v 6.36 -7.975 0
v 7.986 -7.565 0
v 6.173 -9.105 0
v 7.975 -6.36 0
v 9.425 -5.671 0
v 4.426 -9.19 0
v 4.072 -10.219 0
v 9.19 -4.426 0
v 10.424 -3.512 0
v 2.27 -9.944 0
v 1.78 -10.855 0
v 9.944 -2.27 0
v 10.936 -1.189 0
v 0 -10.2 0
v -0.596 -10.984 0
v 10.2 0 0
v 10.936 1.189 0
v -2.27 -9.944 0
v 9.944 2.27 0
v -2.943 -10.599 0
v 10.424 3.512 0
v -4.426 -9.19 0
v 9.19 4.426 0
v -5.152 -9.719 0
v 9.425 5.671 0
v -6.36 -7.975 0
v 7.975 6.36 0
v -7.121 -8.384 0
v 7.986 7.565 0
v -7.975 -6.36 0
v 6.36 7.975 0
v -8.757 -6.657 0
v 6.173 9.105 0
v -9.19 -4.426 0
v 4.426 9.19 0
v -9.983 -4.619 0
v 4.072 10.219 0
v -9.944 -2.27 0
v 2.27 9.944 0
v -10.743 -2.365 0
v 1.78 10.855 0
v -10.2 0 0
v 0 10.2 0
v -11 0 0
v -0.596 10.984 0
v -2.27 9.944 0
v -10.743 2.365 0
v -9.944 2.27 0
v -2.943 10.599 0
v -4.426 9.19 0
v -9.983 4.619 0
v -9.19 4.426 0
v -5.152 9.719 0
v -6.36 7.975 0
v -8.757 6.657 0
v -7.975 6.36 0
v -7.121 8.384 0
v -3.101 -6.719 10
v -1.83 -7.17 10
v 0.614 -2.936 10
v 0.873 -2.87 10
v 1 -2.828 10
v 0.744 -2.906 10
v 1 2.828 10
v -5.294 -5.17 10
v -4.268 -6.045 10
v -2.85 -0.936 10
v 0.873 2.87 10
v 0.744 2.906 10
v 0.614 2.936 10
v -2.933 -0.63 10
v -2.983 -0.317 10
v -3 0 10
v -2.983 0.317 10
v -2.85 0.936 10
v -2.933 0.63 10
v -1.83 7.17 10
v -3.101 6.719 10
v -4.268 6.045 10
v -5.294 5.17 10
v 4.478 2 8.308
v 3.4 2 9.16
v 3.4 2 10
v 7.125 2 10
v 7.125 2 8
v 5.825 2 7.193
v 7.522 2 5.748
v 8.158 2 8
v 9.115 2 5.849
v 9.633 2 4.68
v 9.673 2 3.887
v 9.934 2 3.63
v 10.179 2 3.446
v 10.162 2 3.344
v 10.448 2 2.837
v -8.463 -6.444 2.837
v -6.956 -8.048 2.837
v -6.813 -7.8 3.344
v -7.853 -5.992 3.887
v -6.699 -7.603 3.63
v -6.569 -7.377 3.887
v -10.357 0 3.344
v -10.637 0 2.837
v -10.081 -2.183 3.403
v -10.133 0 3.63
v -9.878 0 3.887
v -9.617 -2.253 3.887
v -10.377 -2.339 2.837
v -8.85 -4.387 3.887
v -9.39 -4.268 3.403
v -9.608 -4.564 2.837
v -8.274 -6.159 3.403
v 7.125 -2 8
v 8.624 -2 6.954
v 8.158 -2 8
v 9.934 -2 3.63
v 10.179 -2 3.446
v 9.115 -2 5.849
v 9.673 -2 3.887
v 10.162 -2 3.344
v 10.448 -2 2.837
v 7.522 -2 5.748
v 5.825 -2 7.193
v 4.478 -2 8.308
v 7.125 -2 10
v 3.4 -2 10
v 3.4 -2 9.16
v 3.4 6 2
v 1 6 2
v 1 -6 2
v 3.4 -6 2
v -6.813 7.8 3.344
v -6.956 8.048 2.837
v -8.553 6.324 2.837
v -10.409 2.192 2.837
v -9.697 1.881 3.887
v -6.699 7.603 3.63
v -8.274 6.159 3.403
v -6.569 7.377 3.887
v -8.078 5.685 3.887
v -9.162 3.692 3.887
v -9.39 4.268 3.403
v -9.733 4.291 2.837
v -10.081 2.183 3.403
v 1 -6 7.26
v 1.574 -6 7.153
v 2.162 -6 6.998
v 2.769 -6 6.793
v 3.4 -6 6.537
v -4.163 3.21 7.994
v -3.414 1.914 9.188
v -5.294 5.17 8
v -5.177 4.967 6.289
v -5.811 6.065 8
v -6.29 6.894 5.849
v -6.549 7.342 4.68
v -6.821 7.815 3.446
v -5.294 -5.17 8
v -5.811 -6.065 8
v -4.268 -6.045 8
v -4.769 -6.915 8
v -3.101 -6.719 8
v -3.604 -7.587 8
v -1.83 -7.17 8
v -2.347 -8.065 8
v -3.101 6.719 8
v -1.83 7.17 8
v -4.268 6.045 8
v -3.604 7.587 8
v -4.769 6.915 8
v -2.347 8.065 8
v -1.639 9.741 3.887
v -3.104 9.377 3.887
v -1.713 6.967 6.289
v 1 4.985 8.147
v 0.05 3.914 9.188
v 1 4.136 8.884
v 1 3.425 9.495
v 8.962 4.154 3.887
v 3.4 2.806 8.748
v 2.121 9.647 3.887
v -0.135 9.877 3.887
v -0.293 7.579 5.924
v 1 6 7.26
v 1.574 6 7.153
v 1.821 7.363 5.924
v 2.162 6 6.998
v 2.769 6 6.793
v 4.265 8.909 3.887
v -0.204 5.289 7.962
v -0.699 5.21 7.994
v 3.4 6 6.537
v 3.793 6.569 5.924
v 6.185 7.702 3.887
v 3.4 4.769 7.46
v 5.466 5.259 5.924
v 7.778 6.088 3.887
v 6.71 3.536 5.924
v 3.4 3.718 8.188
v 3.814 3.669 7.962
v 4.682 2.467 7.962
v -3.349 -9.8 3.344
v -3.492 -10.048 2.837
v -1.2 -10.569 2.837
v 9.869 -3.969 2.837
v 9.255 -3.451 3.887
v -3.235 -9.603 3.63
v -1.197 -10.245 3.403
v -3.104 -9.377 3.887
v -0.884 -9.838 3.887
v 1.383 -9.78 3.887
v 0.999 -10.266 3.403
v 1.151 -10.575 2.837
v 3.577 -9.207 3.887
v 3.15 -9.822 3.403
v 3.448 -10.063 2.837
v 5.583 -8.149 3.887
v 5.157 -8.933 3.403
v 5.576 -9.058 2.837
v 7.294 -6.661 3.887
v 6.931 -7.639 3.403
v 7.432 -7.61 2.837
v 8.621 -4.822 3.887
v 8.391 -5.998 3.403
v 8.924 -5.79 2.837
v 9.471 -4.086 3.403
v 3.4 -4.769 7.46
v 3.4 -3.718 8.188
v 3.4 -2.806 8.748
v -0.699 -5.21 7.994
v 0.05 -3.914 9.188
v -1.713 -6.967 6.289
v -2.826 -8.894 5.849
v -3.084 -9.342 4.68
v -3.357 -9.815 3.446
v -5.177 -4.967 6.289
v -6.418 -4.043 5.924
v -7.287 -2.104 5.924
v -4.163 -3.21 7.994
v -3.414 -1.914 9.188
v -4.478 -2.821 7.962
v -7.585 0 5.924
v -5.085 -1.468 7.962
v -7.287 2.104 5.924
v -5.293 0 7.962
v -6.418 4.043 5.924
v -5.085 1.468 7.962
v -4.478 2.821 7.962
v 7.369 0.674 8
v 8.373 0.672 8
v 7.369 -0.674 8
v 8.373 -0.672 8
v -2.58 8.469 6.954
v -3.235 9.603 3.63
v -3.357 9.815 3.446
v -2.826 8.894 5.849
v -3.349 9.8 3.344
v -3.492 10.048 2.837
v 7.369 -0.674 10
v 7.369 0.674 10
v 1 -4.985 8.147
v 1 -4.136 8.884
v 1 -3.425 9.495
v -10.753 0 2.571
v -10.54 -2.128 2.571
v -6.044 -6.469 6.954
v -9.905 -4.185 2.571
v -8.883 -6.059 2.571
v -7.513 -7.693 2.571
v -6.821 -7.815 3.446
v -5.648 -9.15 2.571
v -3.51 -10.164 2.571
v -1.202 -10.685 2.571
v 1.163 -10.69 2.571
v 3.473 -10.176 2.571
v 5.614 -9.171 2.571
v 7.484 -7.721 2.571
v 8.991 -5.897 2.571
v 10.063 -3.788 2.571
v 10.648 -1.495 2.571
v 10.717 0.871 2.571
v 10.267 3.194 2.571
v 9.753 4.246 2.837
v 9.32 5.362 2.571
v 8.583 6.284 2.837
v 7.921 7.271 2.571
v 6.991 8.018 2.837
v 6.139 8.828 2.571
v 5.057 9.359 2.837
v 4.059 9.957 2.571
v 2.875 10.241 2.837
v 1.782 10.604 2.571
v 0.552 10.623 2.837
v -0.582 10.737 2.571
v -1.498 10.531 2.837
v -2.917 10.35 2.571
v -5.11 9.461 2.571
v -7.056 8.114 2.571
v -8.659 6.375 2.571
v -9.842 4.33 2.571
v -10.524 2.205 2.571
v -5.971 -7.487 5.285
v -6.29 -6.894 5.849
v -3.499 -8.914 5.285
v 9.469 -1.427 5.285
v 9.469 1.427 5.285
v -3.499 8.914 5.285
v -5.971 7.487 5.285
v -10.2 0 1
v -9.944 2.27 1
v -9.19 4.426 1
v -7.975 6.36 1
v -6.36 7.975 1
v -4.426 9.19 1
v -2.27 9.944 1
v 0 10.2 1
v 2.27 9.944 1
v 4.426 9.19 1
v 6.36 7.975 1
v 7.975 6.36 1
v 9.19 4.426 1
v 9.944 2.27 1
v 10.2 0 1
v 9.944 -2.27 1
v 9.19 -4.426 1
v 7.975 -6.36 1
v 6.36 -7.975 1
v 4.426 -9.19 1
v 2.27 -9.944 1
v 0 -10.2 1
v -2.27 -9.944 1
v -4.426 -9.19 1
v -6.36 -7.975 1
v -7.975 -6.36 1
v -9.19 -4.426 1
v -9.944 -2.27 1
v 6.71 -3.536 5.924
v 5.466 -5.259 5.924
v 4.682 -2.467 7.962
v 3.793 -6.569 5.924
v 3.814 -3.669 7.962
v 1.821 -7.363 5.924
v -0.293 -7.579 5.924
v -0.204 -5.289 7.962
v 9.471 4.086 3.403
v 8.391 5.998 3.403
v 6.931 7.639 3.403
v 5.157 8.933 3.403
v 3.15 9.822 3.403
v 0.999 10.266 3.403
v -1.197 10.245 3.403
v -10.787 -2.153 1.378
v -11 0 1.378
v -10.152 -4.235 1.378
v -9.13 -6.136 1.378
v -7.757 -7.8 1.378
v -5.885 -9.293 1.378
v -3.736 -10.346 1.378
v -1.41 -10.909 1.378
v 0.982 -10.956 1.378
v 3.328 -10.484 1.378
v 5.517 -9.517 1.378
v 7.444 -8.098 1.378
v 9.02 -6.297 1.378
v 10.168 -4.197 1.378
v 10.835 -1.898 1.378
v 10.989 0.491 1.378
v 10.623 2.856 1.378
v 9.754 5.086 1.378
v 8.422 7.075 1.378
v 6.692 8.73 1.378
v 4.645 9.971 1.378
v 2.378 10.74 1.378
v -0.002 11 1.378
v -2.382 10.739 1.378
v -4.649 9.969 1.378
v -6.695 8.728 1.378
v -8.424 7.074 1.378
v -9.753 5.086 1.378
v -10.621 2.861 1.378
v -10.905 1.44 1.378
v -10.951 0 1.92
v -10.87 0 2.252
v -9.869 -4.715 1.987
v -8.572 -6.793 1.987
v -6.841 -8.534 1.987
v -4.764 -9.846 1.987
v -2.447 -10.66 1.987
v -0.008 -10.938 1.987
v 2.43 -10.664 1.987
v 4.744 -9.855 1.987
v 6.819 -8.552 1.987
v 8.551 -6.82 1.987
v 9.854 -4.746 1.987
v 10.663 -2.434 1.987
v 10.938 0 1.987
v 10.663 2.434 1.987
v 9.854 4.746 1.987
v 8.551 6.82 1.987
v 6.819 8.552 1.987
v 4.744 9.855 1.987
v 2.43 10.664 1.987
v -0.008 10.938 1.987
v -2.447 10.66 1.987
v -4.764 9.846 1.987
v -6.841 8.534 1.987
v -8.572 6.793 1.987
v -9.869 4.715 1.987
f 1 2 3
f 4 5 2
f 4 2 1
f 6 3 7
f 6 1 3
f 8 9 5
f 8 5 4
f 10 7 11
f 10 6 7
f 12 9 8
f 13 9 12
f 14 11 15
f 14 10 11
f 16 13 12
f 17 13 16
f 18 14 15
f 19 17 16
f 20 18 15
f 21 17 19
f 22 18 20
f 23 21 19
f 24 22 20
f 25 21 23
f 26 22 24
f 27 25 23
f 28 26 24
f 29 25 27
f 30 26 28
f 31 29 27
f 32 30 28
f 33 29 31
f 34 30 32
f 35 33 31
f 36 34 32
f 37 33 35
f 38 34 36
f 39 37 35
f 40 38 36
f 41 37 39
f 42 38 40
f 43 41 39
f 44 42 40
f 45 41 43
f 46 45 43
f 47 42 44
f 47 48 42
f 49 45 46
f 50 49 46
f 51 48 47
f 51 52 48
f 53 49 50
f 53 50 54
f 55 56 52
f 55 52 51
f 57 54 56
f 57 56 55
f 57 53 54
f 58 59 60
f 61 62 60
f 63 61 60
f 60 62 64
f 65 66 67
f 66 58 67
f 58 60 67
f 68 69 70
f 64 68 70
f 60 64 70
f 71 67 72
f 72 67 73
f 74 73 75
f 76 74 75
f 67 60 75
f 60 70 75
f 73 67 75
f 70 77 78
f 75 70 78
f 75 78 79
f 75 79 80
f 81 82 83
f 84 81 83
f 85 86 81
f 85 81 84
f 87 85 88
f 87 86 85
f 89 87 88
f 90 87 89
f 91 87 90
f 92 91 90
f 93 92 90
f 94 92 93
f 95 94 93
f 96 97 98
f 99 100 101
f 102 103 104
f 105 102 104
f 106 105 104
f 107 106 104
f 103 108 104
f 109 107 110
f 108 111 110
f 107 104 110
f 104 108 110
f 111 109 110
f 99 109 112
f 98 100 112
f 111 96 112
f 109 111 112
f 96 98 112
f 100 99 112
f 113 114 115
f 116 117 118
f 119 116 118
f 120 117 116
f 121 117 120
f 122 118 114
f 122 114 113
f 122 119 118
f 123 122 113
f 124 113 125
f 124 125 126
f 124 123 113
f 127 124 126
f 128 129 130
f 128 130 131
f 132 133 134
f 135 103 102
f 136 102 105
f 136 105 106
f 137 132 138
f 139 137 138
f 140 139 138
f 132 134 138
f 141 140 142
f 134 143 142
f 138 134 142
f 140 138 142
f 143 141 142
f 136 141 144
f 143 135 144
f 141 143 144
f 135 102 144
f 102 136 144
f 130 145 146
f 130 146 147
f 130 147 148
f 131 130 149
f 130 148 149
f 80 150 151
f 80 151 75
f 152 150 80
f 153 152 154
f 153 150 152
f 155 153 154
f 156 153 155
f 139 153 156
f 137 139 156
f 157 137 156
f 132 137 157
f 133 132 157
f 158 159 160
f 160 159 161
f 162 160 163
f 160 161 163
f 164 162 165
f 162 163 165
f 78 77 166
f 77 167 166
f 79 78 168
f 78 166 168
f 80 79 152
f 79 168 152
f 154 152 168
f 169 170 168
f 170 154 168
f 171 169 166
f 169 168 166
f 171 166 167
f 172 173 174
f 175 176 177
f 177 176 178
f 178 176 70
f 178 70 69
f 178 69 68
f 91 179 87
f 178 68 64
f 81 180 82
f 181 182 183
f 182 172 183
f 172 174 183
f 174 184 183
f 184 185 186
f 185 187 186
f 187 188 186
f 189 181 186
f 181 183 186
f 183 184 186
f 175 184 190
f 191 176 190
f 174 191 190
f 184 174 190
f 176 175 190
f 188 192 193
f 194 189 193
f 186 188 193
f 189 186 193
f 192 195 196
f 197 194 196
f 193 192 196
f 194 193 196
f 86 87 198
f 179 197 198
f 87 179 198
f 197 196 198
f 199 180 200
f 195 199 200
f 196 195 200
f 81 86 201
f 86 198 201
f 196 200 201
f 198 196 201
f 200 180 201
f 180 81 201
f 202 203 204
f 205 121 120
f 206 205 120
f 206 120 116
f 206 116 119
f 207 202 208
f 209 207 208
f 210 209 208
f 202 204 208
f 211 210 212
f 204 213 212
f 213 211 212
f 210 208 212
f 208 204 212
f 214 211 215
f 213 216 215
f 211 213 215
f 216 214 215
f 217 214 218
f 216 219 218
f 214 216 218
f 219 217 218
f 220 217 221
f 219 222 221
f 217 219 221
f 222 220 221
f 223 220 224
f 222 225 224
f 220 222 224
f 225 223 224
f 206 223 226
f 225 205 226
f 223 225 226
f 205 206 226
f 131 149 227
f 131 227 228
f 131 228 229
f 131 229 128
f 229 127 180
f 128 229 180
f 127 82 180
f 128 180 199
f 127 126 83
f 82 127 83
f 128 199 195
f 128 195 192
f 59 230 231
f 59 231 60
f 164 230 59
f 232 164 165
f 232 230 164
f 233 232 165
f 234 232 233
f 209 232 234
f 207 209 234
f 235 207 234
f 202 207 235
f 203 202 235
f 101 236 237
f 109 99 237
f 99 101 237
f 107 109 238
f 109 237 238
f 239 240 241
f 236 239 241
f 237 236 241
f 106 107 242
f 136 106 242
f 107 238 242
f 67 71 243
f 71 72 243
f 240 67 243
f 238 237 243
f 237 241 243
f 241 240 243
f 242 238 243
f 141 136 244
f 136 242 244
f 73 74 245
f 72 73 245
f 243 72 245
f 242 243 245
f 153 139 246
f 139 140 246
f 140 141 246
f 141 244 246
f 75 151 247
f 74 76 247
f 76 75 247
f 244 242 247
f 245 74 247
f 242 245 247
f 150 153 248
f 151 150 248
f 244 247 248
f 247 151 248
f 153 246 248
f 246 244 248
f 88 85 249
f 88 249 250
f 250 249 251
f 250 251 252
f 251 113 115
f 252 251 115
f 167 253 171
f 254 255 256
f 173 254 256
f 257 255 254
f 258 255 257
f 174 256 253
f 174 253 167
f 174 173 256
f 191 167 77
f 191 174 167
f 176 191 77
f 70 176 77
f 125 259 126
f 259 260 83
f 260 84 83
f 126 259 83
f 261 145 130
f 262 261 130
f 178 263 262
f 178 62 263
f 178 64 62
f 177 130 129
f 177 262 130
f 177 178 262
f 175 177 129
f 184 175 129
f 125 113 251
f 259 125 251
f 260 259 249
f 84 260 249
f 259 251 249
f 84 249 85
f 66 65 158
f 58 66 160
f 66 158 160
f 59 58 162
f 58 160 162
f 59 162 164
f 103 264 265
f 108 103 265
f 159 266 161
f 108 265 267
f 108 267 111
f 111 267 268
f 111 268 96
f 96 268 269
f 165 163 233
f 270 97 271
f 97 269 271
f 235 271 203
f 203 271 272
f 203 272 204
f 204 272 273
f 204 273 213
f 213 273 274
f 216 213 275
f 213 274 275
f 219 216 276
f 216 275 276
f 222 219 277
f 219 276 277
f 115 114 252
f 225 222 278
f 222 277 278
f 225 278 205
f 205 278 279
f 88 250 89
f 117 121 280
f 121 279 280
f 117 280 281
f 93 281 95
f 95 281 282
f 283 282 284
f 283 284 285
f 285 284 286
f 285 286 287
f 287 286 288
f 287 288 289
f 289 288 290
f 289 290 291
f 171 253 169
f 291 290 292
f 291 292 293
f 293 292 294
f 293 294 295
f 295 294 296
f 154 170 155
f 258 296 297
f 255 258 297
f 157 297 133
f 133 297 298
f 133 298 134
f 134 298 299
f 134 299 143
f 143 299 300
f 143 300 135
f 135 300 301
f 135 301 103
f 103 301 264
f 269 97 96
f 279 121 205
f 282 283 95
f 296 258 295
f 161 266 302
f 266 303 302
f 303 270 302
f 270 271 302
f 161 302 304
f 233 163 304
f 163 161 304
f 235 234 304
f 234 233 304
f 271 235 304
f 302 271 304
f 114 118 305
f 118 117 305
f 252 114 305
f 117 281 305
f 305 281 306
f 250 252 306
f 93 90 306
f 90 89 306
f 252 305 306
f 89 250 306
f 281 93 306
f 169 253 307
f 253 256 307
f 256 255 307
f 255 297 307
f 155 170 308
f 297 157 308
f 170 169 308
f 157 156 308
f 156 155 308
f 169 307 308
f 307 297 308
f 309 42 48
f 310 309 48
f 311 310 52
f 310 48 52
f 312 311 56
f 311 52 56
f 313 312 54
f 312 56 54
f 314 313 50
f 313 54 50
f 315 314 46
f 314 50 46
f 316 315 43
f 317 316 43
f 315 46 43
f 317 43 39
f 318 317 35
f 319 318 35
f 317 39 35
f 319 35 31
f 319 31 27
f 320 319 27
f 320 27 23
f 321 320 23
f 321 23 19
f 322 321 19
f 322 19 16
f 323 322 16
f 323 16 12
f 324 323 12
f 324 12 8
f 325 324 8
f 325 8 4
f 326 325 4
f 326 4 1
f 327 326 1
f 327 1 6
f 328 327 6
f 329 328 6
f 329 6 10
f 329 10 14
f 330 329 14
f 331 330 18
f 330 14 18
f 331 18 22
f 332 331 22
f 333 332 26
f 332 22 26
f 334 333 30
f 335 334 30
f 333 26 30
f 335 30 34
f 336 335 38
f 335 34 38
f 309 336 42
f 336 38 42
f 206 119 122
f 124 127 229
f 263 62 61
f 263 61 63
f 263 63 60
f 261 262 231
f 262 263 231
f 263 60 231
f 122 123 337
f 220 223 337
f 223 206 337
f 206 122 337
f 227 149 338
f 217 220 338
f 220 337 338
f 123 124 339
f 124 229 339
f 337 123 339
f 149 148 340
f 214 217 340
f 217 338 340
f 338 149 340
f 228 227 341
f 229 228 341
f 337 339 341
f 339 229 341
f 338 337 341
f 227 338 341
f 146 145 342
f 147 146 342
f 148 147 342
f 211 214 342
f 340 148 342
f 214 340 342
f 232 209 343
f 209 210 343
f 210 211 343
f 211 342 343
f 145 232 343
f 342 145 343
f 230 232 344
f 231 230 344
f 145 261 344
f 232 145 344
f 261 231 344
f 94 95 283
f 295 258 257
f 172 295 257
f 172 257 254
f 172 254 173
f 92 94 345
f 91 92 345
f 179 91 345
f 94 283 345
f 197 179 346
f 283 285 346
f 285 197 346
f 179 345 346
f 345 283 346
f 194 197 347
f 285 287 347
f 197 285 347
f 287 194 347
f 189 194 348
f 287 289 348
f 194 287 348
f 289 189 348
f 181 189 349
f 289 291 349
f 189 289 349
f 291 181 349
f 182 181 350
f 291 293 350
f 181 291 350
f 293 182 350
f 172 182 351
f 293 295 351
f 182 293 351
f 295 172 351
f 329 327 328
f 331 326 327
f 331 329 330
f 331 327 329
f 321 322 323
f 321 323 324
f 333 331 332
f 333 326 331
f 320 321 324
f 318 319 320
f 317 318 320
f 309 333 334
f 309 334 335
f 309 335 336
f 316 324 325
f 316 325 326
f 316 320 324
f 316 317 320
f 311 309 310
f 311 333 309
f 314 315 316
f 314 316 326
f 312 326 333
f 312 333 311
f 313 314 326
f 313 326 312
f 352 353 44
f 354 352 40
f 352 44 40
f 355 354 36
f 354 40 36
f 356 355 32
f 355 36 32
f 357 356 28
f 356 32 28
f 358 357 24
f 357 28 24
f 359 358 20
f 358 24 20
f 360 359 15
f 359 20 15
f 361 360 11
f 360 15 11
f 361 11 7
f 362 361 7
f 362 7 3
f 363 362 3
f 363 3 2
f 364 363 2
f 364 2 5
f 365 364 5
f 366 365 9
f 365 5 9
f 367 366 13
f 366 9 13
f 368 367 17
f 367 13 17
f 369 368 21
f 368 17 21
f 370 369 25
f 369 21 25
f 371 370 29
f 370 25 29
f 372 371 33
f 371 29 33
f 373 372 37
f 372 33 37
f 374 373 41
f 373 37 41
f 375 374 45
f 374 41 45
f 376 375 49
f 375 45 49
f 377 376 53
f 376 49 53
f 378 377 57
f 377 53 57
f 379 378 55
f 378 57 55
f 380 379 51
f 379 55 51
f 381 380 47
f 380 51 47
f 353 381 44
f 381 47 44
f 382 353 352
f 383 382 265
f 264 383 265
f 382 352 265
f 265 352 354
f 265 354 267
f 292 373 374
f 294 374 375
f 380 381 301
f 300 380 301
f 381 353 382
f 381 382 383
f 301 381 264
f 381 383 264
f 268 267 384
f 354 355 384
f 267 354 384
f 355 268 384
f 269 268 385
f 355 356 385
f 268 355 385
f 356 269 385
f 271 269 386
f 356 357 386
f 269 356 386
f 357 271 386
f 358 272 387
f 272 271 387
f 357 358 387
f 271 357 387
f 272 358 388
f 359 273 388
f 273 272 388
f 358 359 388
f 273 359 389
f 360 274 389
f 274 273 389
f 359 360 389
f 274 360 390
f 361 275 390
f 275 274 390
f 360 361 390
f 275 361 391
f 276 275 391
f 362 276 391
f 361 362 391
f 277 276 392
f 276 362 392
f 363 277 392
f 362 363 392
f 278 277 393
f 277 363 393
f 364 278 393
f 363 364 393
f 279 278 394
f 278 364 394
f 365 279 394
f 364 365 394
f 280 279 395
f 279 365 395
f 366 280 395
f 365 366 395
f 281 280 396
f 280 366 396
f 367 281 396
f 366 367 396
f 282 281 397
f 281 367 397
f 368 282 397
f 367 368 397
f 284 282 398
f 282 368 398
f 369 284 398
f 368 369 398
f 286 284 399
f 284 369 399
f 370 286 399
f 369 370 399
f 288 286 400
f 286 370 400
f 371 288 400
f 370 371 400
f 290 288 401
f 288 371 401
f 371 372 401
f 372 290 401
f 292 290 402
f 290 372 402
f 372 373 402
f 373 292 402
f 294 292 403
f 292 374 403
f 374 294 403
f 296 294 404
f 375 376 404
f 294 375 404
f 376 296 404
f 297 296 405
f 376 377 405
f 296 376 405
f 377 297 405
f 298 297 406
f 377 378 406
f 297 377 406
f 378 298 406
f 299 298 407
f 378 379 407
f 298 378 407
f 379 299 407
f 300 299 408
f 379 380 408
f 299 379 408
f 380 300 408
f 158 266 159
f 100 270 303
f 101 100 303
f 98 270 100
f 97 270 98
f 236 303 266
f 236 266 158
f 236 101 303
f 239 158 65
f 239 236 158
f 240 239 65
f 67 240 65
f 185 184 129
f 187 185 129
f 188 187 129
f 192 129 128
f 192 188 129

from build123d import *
from build123d.topology import SkipClean

# Parameters (mm, degrees)
BOSS_EXTRU_1_DEPTH      = 10
ESQUISSE5_R             = 10.2
ENL_V_MAT_EXTRU_1_DEPTH = 1
CONG_2_R                = 3
ESQUISSE7_W             = 2.4
ESQUISSE7_H             = 12
ENL_V_MAT_EXTRU_2_DEPTH = 8


with BuildPart() as part:
    # Esquisse1 → Boss.-Extru.1 (new body)
    with BuildSketch(Plane.XY):
        with BuildLine():
            ThreePointArc((0.614016819, 2.936491673), (1.070466269, 2.802517077), (1.5, 2.598076211))
            ThreePointArc((1.5, 2.598076211), (1.891817848, 2.328309522), (2.236067977, 2))
            Line((2.236067977, 2), (11.832159566, 2))
            ThreePointArc((11.832159566, 2), (12, 0), (11.832159566, -2))
            Line((11.832159566, -2), (2.236067977, -2))
            ThreePointArc((2.236067977, -2), (1.891817848, -2.328309522), (1.5, -2.598076211))
            ThreePointArc((1.5, -2.598076211), (1.070466269, -2.802517077), (0.614016819, -2.936491673))
            Line((0.614016819, -2.936491673), (-4.184028976, -11.246950766))
            ThreePointArc((-4.184028976, -11.246950766), (-6, -10.392304845), (-7.648130591, -9.246950766))
            Line((-7.648130591, -9.246950766), (-2.850084796, -0.936491673))
            ThreePointArc((-2.850084796, -0.936491673), (-2.962284118, -0.474207555), (-3, 0))
            ThreePointArc((-3, 0), (-2.962284118, 0.474207555), (-2.850084796, 0.936491673))
            Line((-2.850084796, 0.936491673), (-7.648130591, 9.246950766))
            ThreePointArc((-7.648130591, 9.246950766), (-6, 10.392304845), (-4.184028976, 11.246950766))
            Line((-4.184028976, 11.246950766), (0.614016819, 2.936491673))
        make_face()
    extrude(amount=BOSS_EXTRU_1_DEPTH)

    # Esquisse4 → Révolution1 (revolve)
    with SkipClean():  # the faces are left unmerged after this step: merging them gives an invalid solid
        with BuildSketch(Plane(origin=(0, 0, 0), x_dir=(1, 0, 0), z_dir=(0, 1, 0)), mode=Mode.PRIVATE) as r_volution1_sk:
            Polygon((3, -10), (0, -10), (0, 0), (12, 0), (12, -2), align=None)
        revolve(r_volution1_sk.sketch.rotate(Axis((0, 0, 10), (0, 0, -1)), 129.594068227), axis=Axis((0, 0, 10), (0, 0, -1)))

    # Esquisse5 → Enlèv. mat.-Extru.1 (cut)
    with SkipClean():  # the faces are left unmerged after this step: merging them gives an invalid solid
        with BuildSketch(Plane(origin=(0, 0, 0), x_dir=(-1, 0, 0), z_dir=(0, 0, -1))):
            Circle(ESQUISSE5_R)
        extrude(amount=-ENL_V_MAT_EXTRU_1_DEPTH, mode=Mode.SUBTRACT)

    # Esquisse6 → Enlèvement de matière-Révolution1 (revolve, cut)
    with BuildSketch(Plane(origin=(0, 0, 0), x_dir=(1, 0, 0), z_dir=(0, 1, 0)), mode=Mode.PRIVATE) as enl_vement_de_mati_re_r_volution1_sk:
        Polygon((11, 0), (15.480754368, 0), (15.480754368, -10), (7.75, -10), (7.4, -10), (7.4, -8), (8.4, -8), (11, -2), align=None)
    revolve(enl_vement_de_mati_re_r_volution1_sk.sketch.rotate(Axis((0, 0, 0), (0, 0, 1)), 180), axis=Axis((0, 0, 0), (0, 0, 1)), mode=Mode.SUBTRACT)

    # Congé2
    cong_2_edges = [part.edges().sort_by_distance(p)[0] for p in [
        (5.186746988, -8.983709309, 3.445783133),
        (-9.443834359, -4.292245317, 3.445783133),
        (5.186746988, 8.983709309, 3.445783133),
        (11, 0, 2),
    ]]
    fillet(cong_2_edges, radius=CONG_2_R)

    # Esquisse7 → Enlèv. mat.-Extru.2 (cut)
    with BuildSketch(Plane.XY.offset(10)):
        with Locations((2.2, 0)):
            Rectangle(ESQUISSE7_W, ESQUISSE7_H)
    extrude(amount=-ENL_V_MAT_EXTRU_2_DEPTH, mode=Mode.SUBTRACT)


solid = part.part
